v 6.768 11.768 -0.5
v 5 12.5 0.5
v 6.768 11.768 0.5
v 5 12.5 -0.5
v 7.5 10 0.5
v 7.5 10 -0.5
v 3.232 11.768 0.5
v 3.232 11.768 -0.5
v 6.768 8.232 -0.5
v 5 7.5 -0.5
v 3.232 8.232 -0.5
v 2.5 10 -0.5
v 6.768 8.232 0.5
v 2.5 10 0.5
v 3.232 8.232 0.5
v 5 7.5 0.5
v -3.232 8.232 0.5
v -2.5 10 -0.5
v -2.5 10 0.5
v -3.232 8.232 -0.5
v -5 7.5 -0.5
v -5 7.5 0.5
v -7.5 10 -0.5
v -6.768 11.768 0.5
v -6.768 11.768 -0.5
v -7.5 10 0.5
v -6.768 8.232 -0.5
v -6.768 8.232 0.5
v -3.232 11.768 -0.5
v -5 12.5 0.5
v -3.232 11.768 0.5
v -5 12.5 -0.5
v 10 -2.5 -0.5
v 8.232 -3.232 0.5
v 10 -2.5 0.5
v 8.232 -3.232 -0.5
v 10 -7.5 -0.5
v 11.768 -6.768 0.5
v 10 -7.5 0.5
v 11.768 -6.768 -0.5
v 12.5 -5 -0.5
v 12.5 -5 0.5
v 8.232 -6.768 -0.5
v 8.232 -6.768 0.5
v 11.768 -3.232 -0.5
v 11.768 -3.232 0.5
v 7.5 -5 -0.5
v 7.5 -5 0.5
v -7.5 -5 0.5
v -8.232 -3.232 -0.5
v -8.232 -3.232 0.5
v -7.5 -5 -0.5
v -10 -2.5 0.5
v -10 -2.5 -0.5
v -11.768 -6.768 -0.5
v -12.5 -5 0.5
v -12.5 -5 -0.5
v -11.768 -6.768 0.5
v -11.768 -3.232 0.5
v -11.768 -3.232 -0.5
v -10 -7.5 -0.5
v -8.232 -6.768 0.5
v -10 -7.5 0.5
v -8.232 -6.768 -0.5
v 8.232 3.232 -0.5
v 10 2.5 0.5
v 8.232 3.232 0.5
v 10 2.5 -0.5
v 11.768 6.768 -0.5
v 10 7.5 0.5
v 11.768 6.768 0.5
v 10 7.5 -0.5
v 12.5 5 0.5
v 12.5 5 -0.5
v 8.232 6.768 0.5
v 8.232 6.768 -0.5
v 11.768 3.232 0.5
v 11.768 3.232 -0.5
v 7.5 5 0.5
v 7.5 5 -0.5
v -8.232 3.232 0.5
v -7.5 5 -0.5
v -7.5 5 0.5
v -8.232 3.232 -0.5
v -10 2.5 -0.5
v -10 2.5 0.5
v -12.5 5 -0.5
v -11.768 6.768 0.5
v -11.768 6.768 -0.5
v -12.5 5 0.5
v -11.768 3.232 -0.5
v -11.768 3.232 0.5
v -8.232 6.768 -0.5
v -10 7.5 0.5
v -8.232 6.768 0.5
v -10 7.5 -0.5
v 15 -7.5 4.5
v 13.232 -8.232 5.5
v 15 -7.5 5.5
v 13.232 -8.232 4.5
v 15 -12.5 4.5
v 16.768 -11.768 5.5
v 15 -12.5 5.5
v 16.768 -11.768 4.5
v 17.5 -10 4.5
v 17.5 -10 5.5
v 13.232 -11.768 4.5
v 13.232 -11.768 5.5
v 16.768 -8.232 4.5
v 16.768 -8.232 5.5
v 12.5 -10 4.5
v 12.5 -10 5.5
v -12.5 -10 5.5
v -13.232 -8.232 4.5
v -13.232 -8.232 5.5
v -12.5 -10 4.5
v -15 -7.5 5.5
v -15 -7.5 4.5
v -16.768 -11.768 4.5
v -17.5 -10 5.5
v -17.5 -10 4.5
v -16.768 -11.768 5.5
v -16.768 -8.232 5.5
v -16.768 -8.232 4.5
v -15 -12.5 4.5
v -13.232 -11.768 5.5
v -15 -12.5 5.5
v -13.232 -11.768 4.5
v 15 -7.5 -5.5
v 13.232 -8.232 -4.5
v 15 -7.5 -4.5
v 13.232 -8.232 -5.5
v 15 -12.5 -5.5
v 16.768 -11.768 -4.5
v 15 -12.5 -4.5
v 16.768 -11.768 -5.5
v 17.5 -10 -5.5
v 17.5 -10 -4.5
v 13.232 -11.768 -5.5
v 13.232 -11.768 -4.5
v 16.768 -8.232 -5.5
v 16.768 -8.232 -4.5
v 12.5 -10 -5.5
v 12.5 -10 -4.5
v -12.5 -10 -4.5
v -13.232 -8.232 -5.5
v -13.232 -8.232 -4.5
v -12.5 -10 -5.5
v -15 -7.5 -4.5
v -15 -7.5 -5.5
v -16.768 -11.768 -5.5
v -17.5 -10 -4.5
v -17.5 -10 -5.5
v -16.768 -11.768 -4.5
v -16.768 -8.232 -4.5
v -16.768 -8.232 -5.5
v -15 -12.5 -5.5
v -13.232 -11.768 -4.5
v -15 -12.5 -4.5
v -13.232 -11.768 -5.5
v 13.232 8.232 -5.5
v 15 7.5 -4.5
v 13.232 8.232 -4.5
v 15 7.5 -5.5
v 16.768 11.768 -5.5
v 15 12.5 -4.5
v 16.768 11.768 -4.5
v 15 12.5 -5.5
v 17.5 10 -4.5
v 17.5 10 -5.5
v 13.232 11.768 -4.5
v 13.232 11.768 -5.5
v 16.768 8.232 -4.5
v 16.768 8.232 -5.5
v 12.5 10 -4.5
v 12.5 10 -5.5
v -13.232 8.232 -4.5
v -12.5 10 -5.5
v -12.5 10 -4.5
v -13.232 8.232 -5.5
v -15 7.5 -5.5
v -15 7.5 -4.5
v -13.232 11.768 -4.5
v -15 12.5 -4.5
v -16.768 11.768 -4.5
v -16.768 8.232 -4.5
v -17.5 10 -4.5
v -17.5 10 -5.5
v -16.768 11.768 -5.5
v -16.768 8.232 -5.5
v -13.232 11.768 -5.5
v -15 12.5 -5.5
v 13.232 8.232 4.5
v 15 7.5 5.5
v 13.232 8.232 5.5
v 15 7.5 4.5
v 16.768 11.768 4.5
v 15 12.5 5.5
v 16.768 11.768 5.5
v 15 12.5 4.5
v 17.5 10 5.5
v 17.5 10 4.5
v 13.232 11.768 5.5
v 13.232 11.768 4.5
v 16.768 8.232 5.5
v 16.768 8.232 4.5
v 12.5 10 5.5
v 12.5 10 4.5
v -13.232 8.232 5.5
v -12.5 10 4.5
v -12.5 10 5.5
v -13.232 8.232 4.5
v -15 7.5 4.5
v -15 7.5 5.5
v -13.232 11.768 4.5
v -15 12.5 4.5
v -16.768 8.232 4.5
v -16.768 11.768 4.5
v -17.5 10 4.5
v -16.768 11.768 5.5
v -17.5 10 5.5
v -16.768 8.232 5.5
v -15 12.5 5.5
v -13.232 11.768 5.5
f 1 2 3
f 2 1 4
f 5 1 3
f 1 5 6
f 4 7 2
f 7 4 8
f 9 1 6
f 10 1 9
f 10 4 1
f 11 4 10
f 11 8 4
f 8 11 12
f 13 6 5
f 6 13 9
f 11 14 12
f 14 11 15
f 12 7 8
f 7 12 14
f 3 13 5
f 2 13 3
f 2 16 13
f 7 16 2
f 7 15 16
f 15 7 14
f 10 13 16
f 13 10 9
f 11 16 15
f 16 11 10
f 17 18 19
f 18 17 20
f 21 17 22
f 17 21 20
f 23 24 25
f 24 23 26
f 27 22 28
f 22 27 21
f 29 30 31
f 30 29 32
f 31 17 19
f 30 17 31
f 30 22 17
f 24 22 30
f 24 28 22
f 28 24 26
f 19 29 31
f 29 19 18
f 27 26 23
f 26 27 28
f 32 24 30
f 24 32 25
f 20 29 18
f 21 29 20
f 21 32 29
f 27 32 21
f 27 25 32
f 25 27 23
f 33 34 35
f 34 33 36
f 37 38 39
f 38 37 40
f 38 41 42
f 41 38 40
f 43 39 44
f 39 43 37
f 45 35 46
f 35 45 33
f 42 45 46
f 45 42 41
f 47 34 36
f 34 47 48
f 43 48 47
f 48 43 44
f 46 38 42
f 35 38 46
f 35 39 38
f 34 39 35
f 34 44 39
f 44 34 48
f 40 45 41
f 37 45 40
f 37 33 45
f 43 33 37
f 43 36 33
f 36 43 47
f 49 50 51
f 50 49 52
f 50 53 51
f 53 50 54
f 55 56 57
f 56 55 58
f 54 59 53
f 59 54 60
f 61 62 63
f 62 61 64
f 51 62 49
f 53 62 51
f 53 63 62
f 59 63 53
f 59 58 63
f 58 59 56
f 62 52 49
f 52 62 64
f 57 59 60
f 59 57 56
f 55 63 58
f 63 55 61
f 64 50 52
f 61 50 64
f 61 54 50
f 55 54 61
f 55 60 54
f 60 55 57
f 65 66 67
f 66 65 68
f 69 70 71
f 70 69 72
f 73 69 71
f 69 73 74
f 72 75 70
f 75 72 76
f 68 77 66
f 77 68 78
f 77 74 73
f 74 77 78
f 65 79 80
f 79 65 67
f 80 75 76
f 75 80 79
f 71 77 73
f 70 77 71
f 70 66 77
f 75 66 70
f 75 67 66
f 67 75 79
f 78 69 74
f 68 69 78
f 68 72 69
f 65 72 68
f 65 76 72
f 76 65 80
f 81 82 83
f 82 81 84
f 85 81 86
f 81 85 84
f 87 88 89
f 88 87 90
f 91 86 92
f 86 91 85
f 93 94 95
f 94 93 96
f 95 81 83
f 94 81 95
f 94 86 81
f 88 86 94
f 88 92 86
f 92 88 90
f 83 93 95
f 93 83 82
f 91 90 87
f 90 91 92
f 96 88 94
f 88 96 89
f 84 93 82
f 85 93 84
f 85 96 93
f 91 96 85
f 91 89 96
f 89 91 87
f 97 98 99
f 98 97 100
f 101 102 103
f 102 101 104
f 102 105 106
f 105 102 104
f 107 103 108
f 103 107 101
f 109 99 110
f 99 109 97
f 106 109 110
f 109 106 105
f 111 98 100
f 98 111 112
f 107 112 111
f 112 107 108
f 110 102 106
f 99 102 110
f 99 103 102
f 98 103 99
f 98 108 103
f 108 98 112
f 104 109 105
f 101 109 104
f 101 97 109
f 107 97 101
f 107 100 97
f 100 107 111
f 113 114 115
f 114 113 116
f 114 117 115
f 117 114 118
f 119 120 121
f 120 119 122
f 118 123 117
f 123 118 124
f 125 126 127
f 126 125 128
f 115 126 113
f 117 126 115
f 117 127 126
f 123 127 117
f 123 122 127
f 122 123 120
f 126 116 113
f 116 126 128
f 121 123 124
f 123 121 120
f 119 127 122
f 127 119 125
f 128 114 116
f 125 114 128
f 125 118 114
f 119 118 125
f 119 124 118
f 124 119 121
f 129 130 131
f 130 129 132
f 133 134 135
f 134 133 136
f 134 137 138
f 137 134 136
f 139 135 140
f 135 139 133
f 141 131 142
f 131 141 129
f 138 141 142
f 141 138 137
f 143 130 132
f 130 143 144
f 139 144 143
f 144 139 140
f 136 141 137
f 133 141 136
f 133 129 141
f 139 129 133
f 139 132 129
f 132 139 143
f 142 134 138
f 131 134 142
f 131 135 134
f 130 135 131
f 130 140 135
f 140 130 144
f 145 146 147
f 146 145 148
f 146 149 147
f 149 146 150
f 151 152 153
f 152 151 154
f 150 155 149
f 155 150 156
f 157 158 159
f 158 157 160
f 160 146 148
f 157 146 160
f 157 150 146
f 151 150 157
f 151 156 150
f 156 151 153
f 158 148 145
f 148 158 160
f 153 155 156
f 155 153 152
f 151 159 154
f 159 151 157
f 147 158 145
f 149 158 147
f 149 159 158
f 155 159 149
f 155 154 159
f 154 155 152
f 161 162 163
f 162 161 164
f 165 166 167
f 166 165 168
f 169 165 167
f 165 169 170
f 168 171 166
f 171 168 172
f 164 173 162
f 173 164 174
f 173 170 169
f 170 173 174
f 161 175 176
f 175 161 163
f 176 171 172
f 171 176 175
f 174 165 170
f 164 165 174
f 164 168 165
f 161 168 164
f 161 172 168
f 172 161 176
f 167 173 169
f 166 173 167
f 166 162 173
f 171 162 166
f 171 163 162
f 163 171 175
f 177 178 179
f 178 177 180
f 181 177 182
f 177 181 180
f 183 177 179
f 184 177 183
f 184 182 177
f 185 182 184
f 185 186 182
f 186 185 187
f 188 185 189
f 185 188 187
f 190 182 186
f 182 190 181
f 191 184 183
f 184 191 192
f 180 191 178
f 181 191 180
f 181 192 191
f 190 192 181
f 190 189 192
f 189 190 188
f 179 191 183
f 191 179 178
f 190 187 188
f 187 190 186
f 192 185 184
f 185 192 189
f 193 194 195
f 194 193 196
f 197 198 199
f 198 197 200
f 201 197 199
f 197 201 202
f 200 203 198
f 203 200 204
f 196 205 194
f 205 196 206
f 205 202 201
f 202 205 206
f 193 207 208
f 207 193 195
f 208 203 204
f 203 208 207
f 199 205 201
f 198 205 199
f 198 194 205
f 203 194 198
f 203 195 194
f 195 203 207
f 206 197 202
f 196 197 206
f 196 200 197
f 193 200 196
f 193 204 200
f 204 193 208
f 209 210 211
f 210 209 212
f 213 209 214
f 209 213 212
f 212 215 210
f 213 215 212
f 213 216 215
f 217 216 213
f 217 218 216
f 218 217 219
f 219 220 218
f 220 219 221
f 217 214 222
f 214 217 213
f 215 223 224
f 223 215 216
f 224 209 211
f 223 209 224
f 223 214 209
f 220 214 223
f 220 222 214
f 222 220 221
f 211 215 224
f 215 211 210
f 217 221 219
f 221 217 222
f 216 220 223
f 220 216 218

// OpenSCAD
module mirrorCopy(vec=[1,0,0], vec2=[0,0,0], vec3=[0,0,0]){
    
    //echo(str("Vec1=",vec," Vec2=", vec2, " Vec3=", vec3));
    children();
    mirror(vec) children();

    if(vec2){    
        mirror(vec2){
            children();
            mirror(vec) children();
        }
    }

    if(vec3){
        mirror(vec3){
            children();
            mirror(vec) children();
            mirror(vec2){
                children();
                mirror(vec) children();
            }
        }
    }
    
} 

mirrorCopy([1,0,0])color("green")translate([5,10,0])cylinder(h=1,d=5,center=true);
mirrorCopy([1,0,0],[0,1,0])color("blue")translate([10,5,0])cylinder(h=1,d=5,center=true);
mirrorCopy([1,0,0],[0,1,0],[0,0,1])color("red")translate([15,10,5])cylinder(h=1,d=5,center=true);
